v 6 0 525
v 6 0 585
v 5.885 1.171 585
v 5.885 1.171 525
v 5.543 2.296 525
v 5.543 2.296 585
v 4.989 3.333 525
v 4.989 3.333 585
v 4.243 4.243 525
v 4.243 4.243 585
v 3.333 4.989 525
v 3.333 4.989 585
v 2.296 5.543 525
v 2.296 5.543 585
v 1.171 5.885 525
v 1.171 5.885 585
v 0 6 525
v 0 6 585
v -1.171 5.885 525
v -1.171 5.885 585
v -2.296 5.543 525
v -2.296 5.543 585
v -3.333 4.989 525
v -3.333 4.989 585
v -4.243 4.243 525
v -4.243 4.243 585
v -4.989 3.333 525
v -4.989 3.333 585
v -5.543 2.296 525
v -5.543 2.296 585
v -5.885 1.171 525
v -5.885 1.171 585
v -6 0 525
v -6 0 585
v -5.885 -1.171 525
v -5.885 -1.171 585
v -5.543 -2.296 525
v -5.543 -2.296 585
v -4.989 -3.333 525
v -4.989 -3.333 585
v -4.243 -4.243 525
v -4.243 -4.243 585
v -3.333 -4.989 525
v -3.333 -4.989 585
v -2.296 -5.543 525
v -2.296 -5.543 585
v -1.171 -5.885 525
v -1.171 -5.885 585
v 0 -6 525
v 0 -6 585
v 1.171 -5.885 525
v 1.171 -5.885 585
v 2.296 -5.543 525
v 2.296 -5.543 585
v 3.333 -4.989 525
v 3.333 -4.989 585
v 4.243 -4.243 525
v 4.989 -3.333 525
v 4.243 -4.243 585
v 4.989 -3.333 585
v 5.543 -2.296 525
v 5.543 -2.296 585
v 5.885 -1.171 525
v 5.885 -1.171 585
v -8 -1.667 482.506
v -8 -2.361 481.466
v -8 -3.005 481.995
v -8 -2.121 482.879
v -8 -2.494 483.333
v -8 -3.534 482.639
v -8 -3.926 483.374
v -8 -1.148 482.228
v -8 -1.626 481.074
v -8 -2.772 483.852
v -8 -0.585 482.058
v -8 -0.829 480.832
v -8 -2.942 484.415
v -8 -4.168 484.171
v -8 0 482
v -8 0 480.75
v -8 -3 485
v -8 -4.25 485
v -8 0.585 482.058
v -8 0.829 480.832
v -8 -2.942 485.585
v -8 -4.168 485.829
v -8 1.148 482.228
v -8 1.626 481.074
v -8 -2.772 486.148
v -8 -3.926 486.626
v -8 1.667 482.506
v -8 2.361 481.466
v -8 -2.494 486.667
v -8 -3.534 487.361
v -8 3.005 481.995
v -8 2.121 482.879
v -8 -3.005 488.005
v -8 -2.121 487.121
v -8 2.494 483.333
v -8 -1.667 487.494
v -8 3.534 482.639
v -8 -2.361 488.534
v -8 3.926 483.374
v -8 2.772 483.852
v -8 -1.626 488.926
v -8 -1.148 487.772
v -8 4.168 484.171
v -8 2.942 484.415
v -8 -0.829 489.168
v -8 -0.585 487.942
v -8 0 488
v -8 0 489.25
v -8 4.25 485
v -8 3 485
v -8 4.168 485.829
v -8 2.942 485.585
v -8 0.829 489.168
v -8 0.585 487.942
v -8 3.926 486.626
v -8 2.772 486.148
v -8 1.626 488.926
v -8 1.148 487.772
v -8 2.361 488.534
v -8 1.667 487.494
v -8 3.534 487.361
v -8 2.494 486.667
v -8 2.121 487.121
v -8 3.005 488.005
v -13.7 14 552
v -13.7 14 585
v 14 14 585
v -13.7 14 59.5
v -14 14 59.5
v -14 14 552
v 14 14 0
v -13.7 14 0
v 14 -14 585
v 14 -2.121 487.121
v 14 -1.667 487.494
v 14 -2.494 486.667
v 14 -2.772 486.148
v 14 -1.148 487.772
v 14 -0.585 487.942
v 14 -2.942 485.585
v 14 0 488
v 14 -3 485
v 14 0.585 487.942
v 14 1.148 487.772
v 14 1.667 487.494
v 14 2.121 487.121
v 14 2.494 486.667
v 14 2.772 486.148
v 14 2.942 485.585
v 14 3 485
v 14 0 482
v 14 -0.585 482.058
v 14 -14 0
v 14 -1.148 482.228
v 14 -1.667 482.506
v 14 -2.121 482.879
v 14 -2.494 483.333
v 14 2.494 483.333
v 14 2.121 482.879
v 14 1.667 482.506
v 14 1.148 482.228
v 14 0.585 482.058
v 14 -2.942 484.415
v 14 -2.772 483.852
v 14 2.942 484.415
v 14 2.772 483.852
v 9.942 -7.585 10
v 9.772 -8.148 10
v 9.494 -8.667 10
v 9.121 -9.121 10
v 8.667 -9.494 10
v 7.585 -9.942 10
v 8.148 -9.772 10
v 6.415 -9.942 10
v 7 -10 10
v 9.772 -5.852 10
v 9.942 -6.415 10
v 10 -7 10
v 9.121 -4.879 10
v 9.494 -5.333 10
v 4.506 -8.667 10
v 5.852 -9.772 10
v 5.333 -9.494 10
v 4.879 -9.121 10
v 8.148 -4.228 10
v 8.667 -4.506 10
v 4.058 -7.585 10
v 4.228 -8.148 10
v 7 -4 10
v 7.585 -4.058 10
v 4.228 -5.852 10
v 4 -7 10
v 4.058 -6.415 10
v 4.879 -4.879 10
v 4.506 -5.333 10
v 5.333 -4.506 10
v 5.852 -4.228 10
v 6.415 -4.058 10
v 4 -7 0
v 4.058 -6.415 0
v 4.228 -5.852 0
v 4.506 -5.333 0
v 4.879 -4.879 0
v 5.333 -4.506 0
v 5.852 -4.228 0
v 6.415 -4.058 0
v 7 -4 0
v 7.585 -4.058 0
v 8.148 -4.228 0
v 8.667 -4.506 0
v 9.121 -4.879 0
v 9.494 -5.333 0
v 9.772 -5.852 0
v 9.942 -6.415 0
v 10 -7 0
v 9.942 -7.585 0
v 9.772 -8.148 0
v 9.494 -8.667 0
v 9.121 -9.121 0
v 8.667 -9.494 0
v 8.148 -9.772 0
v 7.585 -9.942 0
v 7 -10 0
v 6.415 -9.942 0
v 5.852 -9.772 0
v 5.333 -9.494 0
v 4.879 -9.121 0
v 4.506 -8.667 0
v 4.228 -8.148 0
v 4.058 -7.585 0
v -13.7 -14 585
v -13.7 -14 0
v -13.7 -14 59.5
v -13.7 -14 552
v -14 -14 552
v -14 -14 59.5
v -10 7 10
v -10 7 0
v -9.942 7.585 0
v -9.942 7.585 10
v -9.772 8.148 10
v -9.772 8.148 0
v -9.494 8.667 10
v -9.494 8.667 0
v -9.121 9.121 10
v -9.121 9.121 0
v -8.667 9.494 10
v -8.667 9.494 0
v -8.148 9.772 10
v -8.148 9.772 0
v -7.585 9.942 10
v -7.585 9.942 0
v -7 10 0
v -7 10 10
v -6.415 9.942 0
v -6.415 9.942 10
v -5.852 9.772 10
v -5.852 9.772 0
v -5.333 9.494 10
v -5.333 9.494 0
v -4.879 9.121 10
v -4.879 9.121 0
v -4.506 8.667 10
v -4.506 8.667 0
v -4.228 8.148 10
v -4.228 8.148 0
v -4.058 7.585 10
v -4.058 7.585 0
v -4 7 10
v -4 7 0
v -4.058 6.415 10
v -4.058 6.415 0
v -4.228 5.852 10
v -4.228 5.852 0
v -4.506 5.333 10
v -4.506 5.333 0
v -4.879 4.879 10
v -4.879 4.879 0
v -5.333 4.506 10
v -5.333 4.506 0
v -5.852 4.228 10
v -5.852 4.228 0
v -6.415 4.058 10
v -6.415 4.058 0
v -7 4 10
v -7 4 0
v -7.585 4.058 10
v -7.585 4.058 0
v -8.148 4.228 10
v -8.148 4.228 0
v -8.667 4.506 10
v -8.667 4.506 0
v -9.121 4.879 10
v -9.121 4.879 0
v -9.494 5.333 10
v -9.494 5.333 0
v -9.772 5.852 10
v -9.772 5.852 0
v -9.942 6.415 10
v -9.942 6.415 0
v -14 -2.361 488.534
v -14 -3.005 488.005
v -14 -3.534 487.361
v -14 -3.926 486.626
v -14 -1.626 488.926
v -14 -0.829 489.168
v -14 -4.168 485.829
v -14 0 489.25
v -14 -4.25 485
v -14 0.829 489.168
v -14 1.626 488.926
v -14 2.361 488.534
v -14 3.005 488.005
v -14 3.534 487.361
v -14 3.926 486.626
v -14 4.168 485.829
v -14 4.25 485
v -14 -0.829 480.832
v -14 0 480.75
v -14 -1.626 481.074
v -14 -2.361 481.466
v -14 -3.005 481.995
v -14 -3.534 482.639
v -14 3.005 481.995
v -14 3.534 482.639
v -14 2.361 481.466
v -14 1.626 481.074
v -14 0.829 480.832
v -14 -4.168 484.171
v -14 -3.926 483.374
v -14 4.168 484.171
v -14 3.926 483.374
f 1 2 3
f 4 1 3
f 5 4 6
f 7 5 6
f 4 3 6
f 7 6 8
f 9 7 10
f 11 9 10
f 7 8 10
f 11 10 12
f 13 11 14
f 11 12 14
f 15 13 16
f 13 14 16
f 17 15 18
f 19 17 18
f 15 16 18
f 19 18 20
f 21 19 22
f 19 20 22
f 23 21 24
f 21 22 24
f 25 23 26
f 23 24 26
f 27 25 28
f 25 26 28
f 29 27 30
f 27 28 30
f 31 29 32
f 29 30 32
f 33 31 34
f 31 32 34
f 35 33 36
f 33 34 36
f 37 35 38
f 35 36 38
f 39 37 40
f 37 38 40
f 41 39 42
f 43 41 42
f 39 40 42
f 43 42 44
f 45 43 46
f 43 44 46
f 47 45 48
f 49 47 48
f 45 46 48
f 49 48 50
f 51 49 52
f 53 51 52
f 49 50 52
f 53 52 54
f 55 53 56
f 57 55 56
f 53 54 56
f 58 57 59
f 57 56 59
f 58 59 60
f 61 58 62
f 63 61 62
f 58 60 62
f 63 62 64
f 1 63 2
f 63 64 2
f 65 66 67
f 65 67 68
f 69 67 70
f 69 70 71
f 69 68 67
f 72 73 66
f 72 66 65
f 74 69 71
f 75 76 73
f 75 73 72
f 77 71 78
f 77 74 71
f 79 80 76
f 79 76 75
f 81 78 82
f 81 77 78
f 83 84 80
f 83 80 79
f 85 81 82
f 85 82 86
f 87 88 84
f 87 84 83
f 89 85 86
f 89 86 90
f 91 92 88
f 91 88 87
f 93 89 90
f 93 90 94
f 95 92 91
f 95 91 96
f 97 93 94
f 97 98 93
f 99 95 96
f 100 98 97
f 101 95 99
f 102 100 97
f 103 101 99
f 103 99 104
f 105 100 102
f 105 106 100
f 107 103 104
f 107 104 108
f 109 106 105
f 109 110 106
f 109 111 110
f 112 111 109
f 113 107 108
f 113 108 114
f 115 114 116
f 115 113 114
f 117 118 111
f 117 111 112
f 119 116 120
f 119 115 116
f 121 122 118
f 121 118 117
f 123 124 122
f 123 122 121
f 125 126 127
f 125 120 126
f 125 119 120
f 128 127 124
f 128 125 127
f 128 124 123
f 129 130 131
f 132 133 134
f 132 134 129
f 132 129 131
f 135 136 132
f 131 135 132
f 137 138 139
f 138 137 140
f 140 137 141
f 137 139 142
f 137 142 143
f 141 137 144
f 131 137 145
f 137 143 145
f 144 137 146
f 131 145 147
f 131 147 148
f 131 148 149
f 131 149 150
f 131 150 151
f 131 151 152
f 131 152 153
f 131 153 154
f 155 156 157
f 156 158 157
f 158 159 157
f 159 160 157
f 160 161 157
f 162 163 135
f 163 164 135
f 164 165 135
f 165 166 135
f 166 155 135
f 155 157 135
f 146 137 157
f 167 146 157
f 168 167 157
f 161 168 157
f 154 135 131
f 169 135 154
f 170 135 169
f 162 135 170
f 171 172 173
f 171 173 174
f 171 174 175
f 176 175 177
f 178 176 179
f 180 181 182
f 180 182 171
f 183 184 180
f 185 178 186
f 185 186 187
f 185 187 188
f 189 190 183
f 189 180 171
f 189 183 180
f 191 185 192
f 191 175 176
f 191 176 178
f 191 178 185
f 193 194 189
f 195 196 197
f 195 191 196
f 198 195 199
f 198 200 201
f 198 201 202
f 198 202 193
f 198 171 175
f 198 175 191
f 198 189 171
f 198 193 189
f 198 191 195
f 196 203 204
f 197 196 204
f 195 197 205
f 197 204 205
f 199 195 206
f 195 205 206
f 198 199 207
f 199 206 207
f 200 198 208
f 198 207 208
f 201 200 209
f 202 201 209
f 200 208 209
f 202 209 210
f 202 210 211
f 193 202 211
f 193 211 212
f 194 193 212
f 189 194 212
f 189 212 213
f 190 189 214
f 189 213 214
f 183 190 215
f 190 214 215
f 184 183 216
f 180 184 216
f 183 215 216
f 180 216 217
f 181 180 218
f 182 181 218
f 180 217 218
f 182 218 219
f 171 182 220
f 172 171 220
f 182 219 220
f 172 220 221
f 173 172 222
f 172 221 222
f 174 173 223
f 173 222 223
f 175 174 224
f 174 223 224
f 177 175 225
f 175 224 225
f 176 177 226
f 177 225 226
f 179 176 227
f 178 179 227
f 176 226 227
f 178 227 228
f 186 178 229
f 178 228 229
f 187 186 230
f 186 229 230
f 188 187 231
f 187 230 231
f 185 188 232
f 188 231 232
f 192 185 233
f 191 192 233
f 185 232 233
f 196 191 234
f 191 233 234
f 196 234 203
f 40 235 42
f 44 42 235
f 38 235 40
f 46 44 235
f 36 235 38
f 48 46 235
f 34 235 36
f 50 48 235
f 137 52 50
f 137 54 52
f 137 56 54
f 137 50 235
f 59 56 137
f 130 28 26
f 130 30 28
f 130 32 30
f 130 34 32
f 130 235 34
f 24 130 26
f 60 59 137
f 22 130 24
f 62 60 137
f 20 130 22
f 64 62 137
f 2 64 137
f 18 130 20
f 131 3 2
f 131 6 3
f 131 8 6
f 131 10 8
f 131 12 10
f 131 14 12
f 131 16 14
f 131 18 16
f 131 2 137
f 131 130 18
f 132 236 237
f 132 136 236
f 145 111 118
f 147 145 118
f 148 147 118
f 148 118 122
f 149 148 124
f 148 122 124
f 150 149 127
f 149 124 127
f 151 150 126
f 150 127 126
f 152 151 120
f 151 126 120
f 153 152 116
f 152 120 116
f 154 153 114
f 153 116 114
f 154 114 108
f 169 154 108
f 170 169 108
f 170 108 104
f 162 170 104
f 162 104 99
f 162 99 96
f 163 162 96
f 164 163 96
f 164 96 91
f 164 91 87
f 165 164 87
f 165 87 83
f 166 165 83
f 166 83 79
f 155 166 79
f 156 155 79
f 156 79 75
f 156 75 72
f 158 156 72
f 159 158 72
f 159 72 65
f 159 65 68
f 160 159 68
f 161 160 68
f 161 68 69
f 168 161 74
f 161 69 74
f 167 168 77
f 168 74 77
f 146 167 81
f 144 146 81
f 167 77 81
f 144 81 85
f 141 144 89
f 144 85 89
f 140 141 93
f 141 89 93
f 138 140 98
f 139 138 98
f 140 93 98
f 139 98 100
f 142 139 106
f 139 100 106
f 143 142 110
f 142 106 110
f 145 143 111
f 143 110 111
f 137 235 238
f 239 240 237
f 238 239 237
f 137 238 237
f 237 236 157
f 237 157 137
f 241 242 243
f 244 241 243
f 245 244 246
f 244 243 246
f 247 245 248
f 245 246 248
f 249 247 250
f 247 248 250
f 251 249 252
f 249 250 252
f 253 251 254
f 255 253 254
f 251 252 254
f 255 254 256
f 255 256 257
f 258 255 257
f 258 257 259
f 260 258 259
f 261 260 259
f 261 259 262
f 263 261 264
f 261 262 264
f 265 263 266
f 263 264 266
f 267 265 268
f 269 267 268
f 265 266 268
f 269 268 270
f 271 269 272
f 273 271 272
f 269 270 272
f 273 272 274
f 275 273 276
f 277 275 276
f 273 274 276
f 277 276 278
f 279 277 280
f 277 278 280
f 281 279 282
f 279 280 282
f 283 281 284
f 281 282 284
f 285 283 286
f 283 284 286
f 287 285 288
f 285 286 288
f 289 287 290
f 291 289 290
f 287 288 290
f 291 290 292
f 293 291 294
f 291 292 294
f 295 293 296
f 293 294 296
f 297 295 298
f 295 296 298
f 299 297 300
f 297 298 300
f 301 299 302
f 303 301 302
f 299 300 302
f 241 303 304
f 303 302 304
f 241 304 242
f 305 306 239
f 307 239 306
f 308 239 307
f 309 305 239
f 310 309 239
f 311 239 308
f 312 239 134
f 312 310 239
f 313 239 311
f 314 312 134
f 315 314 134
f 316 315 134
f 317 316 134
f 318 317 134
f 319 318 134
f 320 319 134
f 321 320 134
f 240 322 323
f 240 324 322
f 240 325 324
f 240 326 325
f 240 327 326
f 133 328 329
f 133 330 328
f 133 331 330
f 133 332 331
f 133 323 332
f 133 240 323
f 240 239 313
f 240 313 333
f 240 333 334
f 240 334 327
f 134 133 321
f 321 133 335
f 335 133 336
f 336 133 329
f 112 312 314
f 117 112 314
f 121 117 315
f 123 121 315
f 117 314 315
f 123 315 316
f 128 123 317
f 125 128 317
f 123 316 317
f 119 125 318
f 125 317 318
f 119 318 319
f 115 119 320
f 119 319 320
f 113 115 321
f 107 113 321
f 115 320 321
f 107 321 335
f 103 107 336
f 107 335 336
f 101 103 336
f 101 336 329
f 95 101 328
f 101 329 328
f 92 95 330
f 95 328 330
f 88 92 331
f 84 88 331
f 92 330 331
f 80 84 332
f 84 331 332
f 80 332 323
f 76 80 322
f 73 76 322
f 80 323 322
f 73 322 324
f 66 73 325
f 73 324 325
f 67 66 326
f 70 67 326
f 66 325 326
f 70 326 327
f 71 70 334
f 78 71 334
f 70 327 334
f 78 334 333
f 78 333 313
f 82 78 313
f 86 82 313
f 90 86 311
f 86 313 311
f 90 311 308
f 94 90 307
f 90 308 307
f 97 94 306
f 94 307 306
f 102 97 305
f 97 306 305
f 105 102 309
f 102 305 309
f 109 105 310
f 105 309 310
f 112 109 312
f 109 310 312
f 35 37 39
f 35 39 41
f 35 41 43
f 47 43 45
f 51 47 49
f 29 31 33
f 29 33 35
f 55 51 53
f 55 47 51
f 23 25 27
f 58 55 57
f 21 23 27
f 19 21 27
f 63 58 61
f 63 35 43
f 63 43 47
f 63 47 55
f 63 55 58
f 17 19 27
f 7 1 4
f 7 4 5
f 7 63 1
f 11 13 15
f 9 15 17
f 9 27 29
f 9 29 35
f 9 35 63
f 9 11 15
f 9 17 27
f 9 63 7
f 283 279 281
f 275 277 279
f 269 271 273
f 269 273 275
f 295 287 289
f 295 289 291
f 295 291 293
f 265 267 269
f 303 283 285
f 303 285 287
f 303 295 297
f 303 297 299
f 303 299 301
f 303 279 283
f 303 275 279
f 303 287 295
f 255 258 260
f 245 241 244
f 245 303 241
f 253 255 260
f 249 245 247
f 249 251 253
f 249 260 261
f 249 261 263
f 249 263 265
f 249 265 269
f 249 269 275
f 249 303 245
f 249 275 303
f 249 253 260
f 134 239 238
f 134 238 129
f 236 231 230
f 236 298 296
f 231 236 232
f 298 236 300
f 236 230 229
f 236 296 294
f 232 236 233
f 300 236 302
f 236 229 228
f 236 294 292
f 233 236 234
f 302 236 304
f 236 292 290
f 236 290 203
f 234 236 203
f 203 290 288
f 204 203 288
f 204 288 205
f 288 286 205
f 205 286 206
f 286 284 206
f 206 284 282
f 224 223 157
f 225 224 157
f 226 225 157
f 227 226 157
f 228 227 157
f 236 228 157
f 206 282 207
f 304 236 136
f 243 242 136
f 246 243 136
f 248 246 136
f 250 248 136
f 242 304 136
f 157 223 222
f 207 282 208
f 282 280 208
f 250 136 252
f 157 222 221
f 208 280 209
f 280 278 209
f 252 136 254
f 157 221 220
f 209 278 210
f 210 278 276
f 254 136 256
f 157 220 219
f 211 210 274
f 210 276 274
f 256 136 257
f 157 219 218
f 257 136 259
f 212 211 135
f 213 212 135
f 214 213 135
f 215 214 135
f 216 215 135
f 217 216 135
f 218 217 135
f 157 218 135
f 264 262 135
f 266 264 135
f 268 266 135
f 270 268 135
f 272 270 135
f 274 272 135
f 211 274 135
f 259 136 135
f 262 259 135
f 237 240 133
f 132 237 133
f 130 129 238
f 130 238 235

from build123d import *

# Parameters (mm, degrees)
IZIM1_W                     = 28
IZIM1_H                     = 28
Y_KSEKLIK_EKSTR_ZYON1_DEPTH = 585
IZIM2_R                     = 6
KES_EKSTR_ZYON1_DEPTH       = 60
SKETCH1_R                   = 3
CUT_EXTRUDE1_DEPTH          = 10
SKETCH2_R                   = 3
CUT_EXTRUDE2_DEPTH          = 586.837008049
SKETCH3_R                   = 4.25
CUT_EXTRUDE3_DEPTH          = 6
SKETCH4_W                   = 79.561179617
SKETCH4_H                   = 84.218096563
SKETCH4_W_2                 = 144.712868034
SKETCH4_H_2                 = 206.469543182
CUT_EXTRUDE4_DEPTH          = 0.3


with BuildPart() as part:
    # Çizim1 → Yükseklik-Ekstrüzyon1 (new body)
    with BuildSketch(Plane.XY):
        Rectangle(IZIM1_W, IZIM1_H)
    extrude(amount=Y_KSEKLIK_EKSTR_ZYON1_DEPTH)

    # Çizim2 → Kes-Ekstrüzyon1 (cut)
    with BuildSketch(Plane.XY.offset(585)):
        Circle(IZIM2_R)
    extrude(amount=-KES_EKSTR_ZYON1_DEPTH, mode=Mode.SUBTRACT)

    # Sketch1 → Cut-Extrude1 (cut)
    with BuildSketch(Plane(origin=(0, 0, 0), x_dir=(-1, 0, 0), z_dir=(0, 0, -1))):
        with Locations((-7, -7)):
            Circle(SKETCH1_R)
        with Locations((7, 7)):
            Circle(SKETCH1_R)
    extrude(amount=-CUT_EXTRUDE1_DEPTH, mode=Mode.SUBTRACT)

    # Sketch2 → Cut-Extrude2 (cut, through all)
    with BuildSketch(Plane.ZY.offset(14)):
        with Locations((485, 0)):
            Circle(SKETCH2_R)
    extrude(amount=-CUT_EXTRUDE2_DEPTH, mode=Mode.SUBTRACT)

    # Sketch3 → Cut-Extrude3 (cut)
    with BuildSketch(Plane.ZY.offset(14)):
        with Locations((485, 0)):
            Circle(SKETCH3_R)
    extrude(amount=-CUT_EXTRUDE3_DEPTH, mode=Mode.SUBTRACT)

    # Sketch4 → Cut-Extrude4 (cut)
    with BuildSketch(Plane.ZY.offset(14)):
        with Locations((591.780589809, 6.31374468)):
            Rectangle(SKETCH4_W, SKETCH4_H)
        with Locations((-12.856434017, 14.64786351)):
            Rectangle(SKETCH4_W_2, SKETCH4_H_2)
    extrude(amount=-CUT_EXTRUDE4_DEPTH, mode=Mode.SUBTRACT)


solid = part.part
